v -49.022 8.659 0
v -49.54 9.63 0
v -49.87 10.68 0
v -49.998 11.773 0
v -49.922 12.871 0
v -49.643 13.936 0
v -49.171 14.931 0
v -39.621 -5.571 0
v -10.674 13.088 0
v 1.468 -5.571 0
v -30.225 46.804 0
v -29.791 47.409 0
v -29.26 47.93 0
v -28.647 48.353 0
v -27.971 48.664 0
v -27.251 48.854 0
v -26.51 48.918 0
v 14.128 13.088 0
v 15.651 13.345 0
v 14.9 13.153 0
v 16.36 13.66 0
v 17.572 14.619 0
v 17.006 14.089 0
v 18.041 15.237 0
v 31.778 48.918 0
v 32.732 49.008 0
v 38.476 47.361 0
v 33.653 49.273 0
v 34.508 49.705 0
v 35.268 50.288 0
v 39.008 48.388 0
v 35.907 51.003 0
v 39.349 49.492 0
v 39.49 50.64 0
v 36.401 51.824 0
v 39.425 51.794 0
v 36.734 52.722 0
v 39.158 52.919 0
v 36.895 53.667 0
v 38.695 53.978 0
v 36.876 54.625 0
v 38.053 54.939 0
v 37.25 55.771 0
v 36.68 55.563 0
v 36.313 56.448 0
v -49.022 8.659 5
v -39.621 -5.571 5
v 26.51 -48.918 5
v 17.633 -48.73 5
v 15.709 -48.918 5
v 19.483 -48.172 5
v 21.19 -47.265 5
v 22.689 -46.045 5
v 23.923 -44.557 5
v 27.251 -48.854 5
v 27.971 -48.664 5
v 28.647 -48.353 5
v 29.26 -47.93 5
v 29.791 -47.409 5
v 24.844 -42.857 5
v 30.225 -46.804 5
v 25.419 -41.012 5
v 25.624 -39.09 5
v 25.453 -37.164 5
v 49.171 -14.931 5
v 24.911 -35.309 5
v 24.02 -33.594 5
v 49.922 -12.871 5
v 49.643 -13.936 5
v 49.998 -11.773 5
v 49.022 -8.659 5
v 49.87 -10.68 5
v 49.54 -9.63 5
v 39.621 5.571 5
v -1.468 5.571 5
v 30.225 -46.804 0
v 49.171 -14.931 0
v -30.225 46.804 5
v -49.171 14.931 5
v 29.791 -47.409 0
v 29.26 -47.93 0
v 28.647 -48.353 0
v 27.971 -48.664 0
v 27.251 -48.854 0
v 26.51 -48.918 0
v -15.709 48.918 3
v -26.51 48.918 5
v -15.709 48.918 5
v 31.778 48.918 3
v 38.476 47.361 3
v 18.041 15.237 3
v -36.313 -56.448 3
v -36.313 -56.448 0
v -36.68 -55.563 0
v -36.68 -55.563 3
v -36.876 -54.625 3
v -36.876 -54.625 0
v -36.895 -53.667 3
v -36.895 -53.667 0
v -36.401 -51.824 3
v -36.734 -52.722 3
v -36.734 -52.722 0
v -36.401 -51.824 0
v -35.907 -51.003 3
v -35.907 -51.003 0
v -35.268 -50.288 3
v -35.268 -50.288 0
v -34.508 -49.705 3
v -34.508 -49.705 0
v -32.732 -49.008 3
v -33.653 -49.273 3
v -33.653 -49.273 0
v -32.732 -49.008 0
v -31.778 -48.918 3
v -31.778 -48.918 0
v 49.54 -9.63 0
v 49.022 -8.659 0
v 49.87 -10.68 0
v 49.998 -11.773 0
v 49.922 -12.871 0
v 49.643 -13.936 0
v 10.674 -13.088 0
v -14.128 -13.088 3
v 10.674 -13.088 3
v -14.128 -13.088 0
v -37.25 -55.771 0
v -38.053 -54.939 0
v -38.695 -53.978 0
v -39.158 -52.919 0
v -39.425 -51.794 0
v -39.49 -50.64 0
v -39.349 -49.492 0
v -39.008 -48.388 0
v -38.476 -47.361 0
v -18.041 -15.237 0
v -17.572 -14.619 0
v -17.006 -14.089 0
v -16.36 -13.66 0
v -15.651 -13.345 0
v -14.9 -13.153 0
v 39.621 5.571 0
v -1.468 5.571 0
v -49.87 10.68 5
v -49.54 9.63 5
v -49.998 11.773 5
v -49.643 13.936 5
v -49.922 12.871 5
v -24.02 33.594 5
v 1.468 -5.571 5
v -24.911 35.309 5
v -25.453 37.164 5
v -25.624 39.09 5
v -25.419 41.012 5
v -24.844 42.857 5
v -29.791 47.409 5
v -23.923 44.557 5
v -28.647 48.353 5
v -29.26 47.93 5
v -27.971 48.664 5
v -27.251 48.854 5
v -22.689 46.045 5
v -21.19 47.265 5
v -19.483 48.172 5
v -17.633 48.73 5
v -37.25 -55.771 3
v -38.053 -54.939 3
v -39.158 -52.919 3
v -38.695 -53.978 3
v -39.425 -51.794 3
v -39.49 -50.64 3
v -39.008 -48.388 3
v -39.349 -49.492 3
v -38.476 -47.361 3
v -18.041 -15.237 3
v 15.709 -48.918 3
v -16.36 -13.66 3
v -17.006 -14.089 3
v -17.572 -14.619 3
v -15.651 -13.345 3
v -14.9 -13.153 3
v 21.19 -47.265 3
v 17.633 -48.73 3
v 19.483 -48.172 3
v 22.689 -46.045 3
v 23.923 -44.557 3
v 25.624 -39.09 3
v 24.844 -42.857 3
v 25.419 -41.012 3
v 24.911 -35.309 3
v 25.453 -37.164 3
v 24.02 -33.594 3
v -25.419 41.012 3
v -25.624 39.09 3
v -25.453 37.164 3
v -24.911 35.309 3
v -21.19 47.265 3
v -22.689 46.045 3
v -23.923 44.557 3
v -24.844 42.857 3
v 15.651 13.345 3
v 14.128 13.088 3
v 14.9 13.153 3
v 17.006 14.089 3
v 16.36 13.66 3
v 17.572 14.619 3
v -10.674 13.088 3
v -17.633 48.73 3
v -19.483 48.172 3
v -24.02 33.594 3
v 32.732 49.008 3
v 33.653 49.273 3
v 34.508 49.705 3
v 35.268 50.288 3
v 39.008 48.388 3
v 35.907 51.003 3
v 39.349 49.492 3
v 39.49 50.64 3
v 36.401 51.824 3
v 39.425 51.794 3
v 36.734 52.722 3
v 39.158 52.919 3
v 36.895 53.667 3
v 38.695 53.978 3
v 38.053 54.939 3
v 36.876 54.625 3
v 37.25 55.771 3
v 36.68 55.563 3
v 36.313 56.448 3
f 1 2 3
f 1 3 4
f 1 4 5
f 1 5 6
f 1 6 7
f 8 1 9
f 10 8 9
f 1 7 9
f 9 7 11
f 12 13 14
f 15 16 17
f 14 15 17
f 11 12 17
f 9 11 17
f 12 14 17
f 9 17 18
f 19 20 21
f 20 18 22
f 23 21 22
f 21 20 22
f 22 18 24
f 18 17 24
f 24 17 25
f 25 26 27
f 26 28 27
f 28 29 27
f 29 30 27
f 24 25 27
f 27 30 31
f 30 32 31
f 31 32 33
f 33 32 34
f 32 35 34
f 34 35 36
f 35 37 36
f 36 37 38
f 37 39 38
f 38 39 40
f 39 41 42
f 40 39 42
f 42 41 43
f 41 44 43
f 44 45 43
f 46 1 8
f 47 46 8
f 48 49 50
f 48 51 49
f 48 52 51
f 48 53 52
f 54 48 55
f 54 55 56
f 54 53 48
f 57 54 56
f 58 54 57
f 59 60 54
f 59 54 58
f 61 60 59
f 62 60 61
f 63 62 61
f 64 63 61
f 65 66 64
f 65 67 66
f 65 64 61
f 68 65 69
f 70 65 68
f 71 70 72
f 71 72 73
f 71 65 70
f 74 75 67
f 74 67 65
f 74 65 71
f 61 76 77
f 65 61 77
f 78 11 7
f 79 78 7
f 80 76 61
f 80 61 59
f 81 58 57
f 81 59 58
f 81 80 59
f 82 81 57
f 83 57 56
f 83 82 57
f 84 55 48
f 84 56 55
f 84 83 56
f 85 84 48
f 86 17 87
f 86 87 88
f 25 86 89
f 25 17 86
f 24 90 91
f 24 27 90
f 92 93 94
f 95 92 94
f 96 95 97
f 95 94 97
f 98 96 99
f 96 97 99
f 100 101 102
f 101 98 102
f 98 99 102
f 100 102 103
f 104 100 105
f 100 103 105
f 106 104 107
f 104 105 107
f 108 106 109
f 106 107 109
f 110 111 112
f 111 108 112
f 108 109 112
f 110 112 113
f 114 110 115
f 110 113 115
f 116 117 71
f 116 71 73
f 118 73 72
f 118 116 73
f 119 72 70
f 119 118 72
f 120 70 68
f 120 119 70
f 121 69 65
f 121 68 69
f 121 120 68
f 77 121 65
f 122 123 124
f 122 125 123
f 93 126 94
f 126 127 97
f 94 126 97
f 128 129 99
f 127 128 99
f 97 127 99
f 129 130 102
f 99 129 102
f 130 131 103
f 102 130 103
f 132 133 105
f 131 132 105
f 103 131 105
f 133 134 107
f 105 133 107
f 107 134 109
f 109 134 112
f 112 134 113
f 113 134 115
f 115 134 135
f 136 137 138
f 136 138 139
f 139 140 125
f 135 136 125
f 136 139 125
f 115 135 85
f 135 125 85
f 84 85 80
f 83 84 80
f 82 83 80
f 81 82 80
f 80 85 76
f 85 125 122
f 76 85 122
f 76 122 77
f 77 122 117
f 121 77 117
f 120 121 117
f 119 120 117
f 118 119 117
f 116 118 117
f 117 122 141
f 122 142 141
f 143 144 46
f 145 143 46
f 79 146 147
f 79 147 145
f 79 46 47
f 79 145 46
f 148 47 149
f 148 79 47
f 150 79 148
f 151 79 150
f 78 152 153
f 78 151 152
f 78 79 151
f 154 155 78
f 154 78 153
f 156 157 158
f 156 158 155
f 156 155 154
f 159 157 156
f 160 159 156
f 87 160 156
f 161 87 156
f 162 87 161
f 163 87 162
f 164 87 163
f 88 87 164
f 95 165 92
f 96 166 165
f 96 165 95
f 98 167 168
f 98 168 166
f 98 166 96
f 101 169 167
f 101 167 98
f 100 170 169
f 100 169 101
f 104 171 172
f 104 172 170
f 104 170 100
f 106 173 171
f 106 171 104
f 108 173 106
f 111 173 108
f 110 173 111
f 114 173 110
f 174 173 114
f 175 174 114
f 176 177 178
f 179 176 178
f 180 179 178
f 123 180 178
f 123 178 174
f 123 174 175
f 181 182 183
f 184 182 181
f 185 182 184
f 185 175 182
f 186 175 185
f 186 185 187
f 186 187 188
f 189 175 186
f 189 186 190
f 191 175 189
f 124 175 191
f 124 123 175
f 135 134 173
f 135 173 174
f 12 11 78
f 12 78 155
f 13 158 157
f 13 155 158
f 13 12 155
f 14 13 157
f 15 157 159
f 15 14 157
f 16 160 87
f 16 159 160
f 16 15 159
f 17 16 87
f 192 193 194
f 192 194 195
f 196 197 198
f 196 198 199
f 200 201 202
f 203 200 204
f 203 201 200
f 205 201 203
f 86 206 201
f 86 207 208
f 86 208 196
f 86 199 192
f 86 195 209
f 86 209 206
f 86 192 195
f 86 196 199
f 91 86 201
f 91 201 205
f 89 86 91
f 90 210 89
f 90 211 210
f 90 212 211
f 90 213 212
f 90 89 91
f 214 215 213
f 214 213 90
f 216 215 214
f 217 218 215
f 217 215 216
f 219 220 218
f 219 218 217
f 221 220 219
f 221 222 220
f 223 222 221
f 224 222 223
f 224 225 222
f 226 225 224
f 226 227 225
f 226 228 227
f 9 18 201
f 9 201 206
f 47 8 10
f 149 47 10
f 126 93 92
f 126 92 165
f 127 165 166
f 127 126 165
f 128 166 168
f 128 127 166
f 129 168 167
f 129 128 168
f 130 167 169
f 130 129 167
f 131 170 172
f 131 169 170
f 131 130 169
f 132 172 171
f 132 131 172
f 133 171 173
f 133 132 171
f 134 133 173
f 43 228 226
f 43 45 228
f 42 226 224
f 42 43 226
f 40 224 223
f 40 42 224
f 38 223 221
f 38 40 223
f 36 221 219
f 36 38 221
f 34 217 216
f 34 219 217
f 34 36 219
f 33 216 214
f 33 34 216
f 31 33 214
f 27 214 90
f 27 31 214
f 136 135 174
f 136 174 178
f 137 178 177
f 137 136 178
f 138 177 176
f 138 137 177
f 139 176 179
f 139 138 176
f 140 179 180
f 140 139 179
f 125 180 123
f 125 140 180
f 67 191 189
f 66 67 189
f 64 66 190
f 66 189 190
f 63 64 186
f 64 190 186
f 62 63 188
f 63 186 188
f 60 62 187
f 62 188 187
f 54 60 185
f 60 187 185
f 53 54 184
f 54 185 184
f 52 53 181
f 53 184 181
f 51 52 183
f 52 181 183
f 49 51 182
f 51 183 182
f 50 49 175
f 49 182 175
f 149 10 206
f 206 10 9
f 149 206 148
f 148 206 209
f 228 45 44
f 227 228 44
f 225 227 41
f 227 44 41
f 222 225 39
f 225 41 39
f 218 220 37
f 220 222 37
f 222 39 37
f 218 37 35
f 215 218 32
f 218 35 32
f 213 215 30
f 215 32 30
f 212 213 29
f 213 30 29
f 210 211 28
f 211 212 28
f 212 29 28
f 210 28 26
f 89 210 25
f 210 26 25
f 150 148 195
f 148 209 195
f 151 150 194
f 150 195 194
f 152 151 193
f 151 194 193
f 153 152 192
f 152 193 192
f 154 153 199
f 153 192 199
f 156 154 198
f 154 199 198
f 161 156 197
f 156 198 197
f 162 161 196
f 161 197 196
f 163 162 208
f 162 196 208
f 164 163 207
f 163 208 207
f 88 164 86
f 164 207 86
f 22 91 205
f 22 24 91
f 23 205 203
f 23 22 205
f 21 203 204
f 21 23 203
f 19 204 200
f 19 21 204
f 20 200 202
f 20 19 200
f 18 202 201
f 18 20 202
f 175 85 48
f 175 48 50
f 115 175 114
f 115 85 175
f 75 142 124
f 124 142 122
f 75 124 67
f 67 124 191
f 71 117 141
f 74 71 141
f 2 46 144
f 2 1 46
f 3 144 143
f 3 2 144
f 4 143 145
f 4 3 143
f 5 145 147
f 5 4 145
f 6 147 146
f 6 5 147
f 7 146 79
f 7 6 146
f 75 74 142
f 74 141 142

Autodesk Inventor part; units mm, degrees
ref_plane "YZ Plane" through (0, 0, 0) normal (1, 0, 0) x (0, 1, 0)
ref_plane "XZ Plane" through (0, 0, 0) normal (0, 1, 0) x (-1, 0, 0)
ref_plane "XY Plane" through (0, 0, 0) normal (0, 0, 1) x (1, 0, 0)
sketch "SEGECO_Logo_A" plane through (0, 0, 0) normal (0, 0, 1) x (1, 0, 0)
  line L0 (106.4876, 54.7826) -> (93.1423, 75.2888)
  line L1 (131.2894, 54.7826) -> (106.4876, 54.7826)
  arc A0 (131.2894, 54.7826) -> (135.2032, 56.9315) centre (131.2894, 59.4212) ccw
  line L2 (101.453, 90.6131) -> (148.9397, 90.6131)
  arc A1 (101.453, 90.6131) -> (93.1423, 75.2888) centre (101.453, 80.6974) ccw
  line L3 (155.6383, 89.056) -> (135.2032, 56.9315)
  arc A2 (148.9397, 90.6131) -> (153.4753, 98.1434) centre (148.9397, 95.7441) ccw
  arc A3 (155.6383, 89.056) -> (153.4753, 98.1434) centre (150.146, 92.5498) ccw
  line L4 (91.5373, 98.1434) -> (156.6554, 98.1434) construction
  line L5 (156.6554, 98.1434) -> (156.6554, 54.7826) construction
  line L6 (156.6554, 54.7826) -> (91.5373, 54.7826) construction
  line L7 (91.5373, 54.7826) -> (91.5373, 98.1434) construction
  line L8 (148.9397, 90.6131) -> (148.9397, 98.1434) construction
  dimension "d53" = 9.9157
  dimension "d54" = 5.1311
  dimension "d55" = 6.5095
  dimension "d56" = 4.6386
  dimension "d63" = 1.2062
  dimension "d90" = 123.056
  dimension "d91" = 24.8018
  dimension "d92" = 20.5062
  dimension "d93" = 43.3608
  dimension "d95" = 65.1181
sketch "SEGECO_Logo_B" plane through (0, 0, 0) normal (0, 0, 1) x (1, 0, 0)
  arc A0 (59.5618, 148.275) -> (51.2511, 132.9507) centre (59.5618, 138.3593) ccw
  line L0 (59.5618, 148.275) -> (48.761, 148.275)
  line L1 (45.0457, 146.1613) -> (26.0996, 114.2875)
  line L2 (26.2488, 108.0158) -> (35.65, 93.7862)
  line L3 (35.65, 93.7862) -> (76.7391, 93.7862)
  line L4 (76.7391, 93.7862) -> (51.2511, 132.9507)
  arc A1 (26.0996, 114.2875) -> (26.2488, 108.0158) centre (31.1752, 111.2706) ccw
  line L5 (25.2707, 148.275) -> (76.7391, 148.275) construction
  line L6 (76.7391, 148.275) -> (76.7391, 93.7862) construction
  line L7 (76.7391, 93.7862) -> (25.2707, 93.7862) construction
  line L8 (25.2707, 93.7862) -> (25.2707, 148.275) construction
  arc A2 (48.761, 148.275) -> (45.0457, 146.1613) centre (48.761, 143.9529) ccw
  point P0 (75.2707, 99.3568)
  dimension "d68" = 9.9157
  dimension "d70" = 5.9045
  dimension "d76" = 5.5706
  dimension "d77" = 1.4684
  dimension "d82" = 123.452
  dimension "d83" = 123.056
  dimension "d84" = 14.2295
  dimension "d86" = 54.4888
  dimension "d87" = 51.4684
  dimension "d89" = 23.4904
  dimension "d100" = 4.3221
sketch "Logo_base" plane through (0, 0, 0) normal (0, 0, 1) x (1, 0, 0)
  arc A0 (-15.7088, 48.9181) -> (-24.0196, 33.5938) centre (-15.7088, 39.0024) ccw
  line L0 (-15.7088, 48.9181) -> (-26.5096, 48.9181)
  line L1 (-30.2249, 46.8044) -> (-49.171, 14.9307)
  line L2 (-49.0219, 8.6589) -> (-39.6206, -5.5706)
  line L3 (-39.6206, -5.5706) -> (1.4684, -5.5706)
  line L4 (1.4684, -5.5706) -> (-24.0196, 33.5938)
  arc A1 (-49.171, 14.9307) -> (-49.0219, 8.6589) centre (-44.0955, 11.9137) ccw
  line L5 (-50, 48.9181) -> (1.4684, 48.9181) construction
  line L6 (1.4684, 48.9181) -> (1.4684, -5.5706) construction
  line L7 (1.4684, -5.5706) -> (-50, -5.5706) construction
  line L8 (-50, -5.5706) -> (-50, 48.9181) construction
  arc A2 (-26.5096, 48.9181) -> (-30.2249, 46.8044) centre (-26.5096, 44.596) ccw
  line L9 (-10.6743, 13.0877) -> (-24.0196, 33.5938)
  line L10 (14.1275, 13.0877) -> (-10.6743, 13.0877)
  arc A3 (14.1275, 13.0877) -> (18.0413, 15.2366) centre (14.1275, 17.7263) ccw
  line L11 (-15.7088, 48.9181) -> (31.7778, 48.9181)
  arc A4 (-15.7088, 48.9181) -> (-24.0196, 33.5938) centre (-15.7088, 39.0024) ccw
  line L12 (38.4765, 47.361) -> (18.0413, 15.2366)
  arc A5 (31.7778, 48.9181) -> (36.3134, 56.4485) centre (31.7778, 54.0492) ccw
  arc A6 (38.4765, 47.361) -> (36.3134, 56.4485) centre (32.9841, 50.8548) ccw
  line L13 (-25.6245, 56.4485) -> (39.4935, 56.4485) construction
  line L14 (39.4935, 56.4485) -> (39.4935, 13.0877) construction
  line L15 (39.4935, 13.0877) -> (-25.6245, 13.0877) construction
  line L16 (-25.6245, 13.0877) -> (-25.6245, 56.4485) construction
  line L17 (31.7778, 48.9181) -> (31.7778, 56.4485) construction
  arc A7 (15.7088, -48.9181) -> (24.0196, -33.5938) centre (15.7088, -39.0024) ccw
  line L18 (15.7088, -48.9181) -> (26.5096, -48.9181)
  line L19 (30.2249, -46.8044) -> (49.171, -14.9307)
  line L20 (49.0219, -8.6589) -> (39.6206, 5.5706)
  line L21 (39.6206, 5.5706) -> (-1.4684, 5.5706)
  line L22 (-1.4684, 5.5706) -> (24.0196, -33.5938)
  arc A8 (49.171, -14.9307) -> (49.0219, -8.6589) centre (44.0955, -11.9137) ccw
  line L23 (50, -48.9181) -> (-1.4684, -48.9181) construction
  line L24 (-1.4684, -48.9181) -> (-1.4684, 5.5706) construction
  line L25 (-1.4684, 5.5706) -> (50, 5.5706) construction
  line L26 (50, 5.5706) -> (50, -48.9181) construction
  arc A9 (26.5096, -48.9181) -> (30.2249, -46.8044) centre (26.5096, -44.596) ccw
  line L27 (10.6743, -13.0877) -> (24.0196, -33.5938)
  line L28 (-14.1275, -13.0877) -> (10.6743, -13.0877)
  arc A10 (-14.1275, -13.0877) -> (-18.0413, -15.2366) centre (-14.1275, -17.7263) ccw
  line L29 (15.7088, -48.9181) -> (-31.7778, -48.9181)
  arc A11 (15.7088, -48.9181) -> (24.0196, -33.5938) centre (15.7088, -39.0024) ccw
  line L30 (-38.4765, -47.361) -> (-18.0413, -15.2366)
  arc A12 (-31.7778, -48.9181) -> (-36.3134, -56.4485) centre (-31.7778, -54.0492) ccw
  arc A13 (-38.4765, -47.361) -> (-36.3134, -56.4485) centre (-32.9841, -50.8548) ccw
  line L31 (25.6245, -56.4485) -> (-39.4935, -56.4485) construction
  line L32 (-39.4935, -56.4485) -> (-39.4935, -13.0877) construction
  line L33 (-39.4935, -13.0877) -> (25.6245, -13.0877) construction
  line L34 (25.6245, -13.0877) -> (25.6245, -56.4485) construction
  line L35 (-31.7778, -48.9181) -> (-31.7778, -56.4485) construction
  point P0 (0, 0)
extrude "Logo_A" add sketch "Logo_base" along normal blind 3 contours L11 A5 A6 L12 A3 L10 L4 A0 | L29 A12 A13 L30 A10 L28 L22 A7
extrude "Logo_B" add sketch "Logo_base" along normal blind 5 contours A0 L4 L3 L2 A1 L1 A2 L0 | A7 L22 L21 L20 A8 L19 A9 L18
equation "\"la_wdt_t\" = 65.11809"
equation "\"la_wdt_1\" = 8.20318"
equation "\"la_wdt_2\" = 24.80181"
equation "\"la_hgt_t\" = 43.36081"
equation "\"la_hgt_1\" = 20.50619"
equation "\"la_crv_1\" = 4.6386"
equation "\"la_crv_2\" = 5.13107"
equation "\"la_crv_3\" = 6.50946"
equation "\"la_d_crv_2_3\" = 1.20624"
equation "\"la_lb_crv\" = 9.9157"
equation "\"lb_crv_2\" = 4.32209"
equation "\"lb_hgt_2\" = 31.91169"
equation "\"lb_wdt_1\" = 23.49038"
equation "\"lb_wdt_2\" = 9.00605"
equation "\"lb_wdt_t\" = 51.46841"
equation "\"lb_hgt_t\" = 54.48876"
equation "\"lb_crv_1\" = 5.9045"
equation "\"lb_hgt_1\" = 14.22955"
equation "\"lb_cy\" = 5.57064"
equation "\"lb_cx\" = 1.46841"
equation "\"la_lb_ang_2\" = 56.944183deg"
equation "\"la_lb_ang_1\" = 123.055817deg"
properties part number "Segeco"
